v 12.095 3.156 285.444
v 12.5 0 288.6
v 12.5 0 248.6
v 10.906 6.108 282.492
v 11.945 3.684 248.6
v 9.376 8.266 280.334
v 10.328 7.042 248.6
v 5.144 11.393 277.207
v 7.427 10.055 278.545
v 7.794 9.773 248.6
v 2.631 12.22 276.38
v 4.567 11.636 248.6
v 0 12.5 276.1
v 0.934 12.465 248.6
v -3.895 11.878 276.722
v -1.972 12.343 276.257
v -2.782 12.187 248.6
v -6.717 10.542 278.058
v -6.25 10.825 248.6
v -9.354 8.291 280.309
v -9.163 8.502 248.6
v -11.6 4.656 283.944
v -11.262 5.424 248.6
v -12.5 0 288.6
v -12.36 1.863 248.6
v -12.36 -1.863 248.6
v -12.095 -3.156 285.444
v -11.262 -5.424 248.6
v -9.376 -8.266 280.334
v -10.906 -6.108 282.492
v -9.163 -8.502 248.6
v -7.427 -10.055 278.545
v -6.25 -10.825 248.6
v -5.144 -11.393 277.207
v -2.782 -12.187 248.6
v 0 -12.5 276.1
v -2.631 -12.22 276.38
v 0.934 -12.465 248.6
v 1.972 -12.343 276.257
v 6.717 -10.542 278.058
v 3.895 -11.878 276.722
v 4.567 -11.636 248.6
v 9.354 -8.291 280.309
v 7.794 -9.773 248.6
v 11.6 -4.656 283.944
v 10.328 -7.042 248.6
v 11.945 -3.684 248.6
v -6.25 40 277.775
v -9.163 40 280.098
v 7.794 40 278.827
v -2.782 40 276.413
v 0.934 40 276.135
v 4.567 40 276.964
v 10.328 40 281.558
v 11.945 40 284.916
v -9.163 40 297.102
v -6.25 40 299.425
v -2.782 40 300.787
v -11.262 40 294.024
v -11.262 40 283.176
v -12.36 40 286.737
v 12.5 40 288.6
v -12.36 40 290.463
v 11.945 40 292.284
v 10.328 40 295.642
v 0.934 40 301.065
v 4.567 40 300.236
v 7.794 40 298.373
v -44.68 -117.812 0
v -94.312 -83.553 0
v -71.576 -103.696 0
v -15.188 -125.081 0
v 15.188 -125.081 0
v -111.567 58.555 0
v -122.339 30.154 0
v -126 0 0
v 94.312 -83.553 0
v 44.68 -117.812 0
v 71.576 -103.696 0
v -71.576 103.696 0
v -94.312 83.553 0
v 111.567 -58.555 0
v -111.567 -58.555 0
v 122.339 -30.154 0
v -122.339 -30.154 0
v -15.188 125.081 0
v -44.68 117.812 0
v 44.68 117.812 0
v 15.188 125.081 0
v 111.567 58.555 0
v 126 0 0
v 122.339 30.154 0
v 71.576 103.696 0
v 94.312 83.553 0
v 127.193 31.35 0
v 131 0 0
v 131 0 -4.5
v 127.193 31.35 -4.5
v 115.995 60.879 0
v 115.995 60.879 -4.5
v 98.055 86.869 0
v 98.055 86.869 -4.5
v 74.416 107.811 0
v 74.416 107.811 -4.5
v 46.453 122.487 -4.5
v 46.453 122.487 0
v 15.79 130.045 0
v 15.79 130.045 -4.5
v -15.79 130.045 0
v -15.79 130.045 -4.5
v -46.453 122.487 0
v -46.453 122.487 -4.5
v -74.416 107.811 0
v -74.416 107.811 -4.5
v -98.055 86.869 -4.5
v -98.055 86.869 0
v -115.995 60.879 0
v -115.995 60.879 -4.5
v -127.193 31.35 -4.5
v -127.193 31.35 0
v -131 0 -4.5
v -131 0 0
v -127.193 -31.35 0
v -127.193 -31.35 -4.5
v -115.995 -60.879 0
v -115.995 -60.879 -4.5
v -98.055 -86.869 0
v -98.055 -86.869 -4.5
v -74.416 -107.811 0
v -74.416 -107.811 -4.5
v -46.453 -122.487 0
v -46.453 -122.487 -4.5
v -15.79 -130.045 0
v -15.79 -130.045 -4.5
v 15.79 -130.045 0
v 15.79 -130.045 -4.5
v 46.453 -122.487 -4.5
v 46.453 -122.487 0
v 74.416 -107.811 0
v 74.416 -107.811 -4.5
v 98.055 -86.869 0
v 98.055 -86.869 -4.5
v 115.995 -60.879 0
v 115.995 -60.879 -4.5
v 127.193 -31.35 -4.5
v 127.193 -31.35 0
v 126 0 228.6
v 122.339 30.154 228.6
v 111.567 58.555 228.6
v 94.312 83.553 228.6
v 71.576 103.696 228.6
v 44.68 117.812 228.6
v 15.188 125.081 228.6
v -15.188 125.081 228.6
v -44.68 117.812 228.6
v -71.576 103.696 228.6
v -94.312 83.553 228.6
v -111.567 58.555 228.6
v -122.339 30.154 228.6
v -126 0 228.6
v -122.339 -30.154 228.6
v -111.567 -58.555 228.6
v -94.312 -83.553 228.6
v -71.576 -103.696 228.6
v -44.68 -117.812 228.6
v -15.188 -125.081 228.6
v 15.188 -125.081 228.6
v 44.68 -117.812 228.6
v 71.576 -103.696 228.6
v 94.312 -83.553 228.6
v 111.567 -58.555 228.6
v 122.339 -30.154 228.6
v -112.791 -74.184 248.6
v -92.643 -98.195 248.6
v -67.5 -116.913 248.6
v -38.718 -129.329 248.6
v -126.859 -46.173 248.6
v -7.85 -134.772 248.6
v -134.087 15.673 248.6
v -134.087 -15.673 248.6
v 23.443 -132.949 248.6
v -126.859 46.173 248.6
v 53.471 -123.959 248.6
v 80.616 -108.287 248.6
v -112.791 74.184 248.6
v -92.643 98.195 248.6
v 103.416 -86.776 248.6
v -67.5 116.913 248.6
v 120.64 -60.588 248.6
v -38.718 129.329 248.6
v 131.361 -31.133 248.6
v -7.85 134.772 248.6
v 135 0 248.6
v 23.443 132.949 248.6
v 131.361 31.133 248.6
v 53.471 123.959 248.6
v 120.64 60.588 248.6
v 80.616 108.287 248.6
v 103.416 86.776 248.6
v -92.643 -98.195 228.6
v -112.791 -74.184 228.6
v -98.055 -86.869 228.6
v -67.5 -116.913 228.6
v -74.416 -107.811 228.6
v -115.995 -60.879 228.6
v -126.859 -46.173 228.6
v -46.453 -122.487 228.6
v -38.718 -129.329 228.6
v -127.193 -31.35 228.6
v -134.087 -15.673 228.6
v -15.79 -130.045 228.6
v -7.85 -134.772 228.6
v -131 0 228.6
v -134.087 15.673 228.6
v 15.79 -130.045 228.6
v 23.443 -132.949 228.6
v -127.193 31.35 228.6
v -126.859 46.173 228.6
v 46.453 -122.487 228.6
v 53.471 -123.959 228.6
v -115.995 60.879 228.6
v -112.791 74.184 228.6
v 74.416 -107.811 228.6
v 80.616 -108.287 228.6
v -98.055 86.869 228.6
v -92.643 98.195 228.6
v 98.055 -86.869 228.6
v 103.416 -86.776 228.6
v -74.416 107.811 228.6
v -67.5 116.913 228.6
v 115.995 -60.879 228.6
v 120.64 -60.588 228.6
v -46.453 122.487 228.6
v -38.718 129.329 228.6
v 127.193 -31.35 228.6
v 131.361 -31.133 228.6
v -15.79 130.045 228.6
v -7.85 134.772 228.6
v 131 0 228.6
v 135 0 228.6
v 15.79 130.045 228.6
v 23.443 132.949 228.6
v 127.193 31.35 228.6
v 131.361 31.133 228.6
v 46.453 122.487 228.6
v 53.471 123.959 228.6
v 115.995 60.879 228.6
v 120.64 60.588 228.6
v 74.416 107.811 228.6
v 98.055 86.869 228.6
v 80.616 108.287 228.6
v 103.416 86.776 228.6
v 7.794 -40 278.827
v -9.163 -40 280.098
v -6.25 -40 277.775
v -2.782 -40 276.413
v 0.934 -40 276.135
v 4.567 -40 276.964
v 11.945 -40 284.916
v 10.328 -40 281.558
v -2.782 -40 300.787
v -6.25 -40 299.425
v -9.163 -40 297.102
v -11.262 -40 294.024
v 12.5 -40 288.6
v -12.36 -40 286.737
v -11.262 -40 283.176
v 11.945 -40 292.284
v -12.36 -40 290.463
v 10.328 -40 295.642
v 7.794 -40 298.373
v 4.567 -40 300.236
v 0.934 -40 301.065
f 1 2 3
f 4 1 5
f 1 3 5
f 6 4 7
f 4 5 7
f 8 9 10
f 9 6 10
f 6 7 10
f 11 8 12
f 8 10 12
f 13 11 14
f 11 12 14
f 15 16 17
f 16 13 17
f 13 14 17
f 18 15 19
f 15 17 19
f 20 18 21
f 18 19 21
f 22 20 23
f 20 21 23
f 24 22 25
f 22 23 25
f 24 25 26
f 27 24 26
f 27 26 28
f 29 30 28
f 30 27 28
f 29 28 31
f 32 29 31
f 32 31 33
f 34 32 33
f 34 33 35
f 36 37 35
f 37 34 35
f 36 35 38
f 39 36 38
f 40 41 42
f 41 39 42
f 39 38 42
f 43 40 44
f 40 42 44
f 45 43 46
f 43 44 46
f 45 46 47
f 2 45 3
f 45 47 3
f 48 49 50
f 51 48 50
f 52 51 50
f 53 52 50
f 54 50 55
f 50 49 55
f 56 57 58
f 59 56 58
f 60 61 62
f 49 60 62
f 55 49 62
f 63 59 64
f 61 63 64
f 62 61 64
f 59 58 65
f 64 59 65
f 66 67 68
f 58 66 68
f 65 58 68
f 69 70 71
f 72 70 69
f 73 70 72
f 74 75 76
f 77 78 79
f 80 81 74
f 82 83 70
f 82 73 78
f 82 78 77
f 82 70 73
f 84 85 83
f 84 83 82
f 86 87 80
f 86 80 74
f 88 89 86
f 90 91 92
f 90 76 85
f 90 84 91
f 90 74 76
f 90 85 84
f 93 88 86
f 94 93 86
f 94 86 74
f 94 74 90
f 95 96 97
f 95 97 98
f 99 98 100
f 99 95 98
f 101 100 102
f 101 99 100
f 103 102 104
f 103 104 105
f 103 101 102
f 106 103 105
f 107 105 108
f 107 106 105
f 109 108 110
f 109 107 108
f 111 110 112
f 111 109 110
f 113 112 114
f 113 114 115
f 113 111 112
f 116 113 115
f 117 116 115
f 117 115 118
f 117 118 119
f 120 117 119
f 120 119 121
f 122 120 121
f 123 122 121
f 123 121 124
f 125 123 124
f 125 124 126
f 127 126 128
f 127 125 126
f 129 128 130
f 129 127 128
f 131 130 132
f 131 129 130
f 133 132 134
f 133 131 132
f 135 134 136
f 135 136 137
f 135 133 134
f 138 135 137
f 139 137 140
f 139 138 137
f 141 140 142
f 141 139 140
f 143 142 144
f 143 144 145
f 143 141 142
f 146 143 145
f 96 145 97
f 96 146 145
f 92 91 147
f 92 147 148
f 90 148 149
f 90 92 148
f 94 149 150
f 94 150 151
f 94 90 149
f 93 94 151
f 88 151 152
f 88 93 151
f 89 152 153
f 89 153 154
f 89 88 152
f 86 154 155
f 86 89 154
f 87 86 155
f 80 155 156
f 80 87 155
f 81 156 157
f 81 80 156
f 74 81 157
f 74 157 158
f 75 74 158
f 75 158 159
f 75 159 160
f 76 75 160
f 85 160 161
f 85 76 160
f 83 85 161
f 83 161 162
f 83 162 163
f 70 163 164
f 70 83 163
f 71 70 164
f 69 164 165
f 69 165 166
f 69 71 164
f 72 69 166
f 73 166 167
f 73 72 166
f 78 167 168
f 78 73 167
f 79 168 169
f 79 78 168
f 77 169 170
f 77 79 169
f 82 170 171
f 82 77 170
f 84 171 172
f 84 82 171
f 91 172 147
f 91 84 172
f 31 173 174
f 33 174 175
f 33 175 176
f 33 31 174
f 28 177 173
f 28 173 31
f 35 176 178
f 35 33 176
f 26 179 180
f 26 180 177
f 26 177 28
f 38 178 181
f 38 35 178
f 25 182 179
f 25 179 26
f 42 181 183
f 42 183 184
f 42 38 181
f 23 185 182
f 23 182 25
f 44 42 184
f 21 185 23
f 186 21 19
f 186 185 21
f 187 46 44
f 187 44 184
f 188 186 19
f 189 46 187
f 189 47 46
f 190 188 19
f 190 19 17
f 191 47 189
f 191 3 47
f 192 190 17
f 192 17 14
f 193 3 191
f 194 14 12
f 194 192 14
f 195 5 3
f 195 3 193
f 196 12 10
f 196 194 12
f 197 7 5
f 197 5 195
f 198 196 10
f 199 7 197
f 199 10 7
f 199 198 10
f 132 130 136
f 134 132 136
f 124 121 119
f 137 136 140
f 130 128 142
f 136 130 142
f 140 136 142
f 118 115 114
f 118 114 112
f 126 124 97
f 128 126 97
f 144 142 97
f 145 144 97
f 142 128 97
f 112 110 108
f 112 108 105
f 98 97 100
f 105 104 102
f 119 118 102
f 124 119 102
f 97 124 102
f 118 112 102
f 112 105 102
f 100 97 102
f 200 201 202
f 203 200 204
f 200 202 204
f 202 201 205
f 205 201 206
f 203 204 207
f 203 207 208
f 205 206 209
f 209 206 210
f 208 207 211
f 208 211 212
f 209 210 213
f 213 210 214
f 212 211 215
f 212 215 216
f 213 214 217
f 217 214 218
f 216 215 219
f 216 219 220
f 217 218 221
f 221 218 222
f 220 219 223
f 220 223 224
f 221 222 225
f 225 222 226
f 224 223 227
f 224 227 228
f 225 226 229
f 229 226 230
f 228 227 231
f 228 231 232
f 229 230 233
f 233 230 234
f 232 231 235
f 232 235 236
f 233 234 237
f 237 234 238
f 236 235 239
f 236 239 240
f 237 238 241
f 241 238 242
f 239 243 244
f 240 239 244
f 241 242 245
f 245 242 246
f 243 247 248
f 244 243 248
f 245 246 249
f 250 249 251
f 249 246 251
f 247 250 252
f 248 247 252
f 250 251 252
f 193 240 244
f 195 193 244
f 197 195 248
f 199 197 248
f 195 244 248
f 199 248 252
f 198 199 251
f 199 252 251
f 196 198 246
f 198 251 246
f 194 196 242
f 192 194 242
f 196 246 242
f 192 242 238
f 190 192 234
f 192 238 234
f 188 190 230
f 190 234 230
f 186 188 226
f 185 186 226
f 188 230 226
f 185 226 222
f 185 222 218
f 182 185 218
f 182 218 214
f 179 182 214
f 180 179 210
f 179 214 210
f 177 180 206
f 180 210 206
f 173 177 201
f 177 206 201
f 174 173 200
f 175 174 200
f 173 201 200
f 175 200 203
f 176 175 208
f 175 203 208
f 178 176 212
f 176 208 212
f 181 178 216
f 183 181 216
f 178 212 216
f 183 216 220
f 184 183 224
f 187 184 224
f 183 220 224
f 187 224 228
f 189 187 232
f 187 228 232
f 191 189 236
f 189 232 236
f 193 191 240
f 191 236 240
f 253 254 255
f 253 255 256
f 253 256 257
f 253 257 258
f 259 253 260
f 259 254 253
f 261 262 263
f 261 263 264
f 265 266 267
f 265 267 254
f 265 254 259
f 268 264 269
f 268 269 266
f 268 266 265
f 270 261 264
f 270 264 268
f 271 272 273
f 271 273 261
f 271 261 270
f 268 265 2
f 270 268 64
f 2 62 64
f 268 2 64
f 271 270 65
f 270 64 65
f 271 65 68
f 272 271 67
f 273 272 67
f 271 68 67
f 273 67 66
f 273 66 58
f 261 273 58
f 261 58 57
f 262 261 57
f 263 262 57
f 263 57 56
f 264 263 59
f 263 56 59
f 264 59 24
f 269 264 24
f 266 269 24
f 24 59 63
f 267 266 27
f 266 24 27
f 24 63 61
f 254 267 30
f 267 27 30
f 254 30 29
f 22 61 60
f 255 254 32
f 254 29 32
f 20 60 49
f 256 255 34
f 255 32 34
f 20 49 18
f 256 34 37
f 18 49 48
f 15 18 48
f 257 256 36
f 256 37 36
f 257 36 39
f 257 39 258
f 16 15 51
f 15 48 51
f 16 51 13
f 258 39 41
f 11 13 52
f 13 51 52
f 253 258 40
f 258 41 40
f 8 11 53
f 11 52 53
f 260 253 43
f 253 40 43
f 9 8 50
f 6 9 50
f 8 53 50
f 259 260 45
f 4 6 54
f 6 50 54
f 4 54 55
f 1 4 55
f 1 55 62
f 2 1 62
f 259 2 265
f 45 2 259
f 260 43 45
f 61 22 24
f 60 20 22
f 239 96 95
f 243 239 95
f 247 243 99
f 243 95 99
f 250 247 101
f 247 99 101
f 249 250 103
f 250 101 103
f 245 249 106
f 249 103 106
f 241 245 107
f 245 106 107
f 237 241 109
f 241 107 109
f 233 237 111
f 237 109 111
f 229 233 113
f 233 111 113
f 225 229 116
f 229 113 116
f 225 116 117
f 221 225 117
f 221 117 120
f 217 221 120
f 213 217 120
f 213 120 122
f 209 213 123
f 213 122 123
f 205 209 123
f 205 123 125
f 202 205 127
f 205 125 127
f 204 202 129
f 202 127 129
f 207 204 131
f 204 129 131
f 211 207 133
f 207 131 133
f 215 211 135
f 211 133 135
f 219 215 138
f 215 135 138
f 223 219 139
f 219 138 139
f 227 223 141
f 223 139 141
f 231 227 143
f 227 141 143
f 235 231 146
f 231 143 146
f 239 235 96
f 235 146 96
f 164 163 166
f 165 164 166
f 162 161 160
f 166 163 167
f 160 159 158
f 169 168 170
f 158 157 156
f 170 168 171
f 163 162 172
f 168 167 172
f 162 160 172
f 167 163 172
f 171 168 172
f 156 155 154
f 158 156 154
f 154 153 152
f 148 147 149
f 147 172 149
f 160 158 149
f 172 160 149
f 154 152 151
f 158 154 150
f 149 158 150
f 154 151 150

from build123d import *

# Parameters (mm, degrees)
F0_R          = 131
F0_R_2        = 127
F1_DEPTH      = 4.5
F2_R          = 131
F2_R_2        = 126
F3_DEPTH      = 228.6
F4_R          = 135
F4_R_2        = 126
F5_DEPTH      = 20
F6_R          = 12.5
F7_DEPTH      = 40
F8_R          = 12.5
F9_DEPTH      = 40
F9_DEPTH_BACK = 40


with BuildPart() as f1:
    # F0 (on Top) → F1 (new body)
    with BuildSketch(Plane.XY):
        Circle(F0_R)
        Circle(F0_R_2, mode=Mode.SUBTRACT)
        Circle(F0_R_2)
    extrude(amount=-F1_DEPTH)

    # F2 (on face) → F3 (join)
    with BuildSketch(Plane.XY):
        Circle(F2_R)
        Circle(F2_R_2, mode=Mode.SUBTRACT)
    extrude(amount=F3_DEPTH)

    # F4 (on face) → F5 (join)
    with BuildSketch(Plane.XY.offset(228.6)):
        Circle(F4_R)
        Circle(F4_R_2)
    extrude(amount=F5_DEPTH)

    # F6 (on face) → F7 (join)
    with BuildSketch(Plane.XY.offset(248.6)):
        Circle(F6_R)
    extrude(amount=F7_DEPTH)

    # F8 (on Front) → F9 (join, two sides)
    with BuildSketch(Plane.XZ) as f9_sk:
        with Locations((0, 288.6)):
            Circle(F8_R)
    extrude(amount=-F9_DEPTH)
    extrude(f9_sk.sketch, amount=F9_DEPTH_BACK)


solid = f1.part
